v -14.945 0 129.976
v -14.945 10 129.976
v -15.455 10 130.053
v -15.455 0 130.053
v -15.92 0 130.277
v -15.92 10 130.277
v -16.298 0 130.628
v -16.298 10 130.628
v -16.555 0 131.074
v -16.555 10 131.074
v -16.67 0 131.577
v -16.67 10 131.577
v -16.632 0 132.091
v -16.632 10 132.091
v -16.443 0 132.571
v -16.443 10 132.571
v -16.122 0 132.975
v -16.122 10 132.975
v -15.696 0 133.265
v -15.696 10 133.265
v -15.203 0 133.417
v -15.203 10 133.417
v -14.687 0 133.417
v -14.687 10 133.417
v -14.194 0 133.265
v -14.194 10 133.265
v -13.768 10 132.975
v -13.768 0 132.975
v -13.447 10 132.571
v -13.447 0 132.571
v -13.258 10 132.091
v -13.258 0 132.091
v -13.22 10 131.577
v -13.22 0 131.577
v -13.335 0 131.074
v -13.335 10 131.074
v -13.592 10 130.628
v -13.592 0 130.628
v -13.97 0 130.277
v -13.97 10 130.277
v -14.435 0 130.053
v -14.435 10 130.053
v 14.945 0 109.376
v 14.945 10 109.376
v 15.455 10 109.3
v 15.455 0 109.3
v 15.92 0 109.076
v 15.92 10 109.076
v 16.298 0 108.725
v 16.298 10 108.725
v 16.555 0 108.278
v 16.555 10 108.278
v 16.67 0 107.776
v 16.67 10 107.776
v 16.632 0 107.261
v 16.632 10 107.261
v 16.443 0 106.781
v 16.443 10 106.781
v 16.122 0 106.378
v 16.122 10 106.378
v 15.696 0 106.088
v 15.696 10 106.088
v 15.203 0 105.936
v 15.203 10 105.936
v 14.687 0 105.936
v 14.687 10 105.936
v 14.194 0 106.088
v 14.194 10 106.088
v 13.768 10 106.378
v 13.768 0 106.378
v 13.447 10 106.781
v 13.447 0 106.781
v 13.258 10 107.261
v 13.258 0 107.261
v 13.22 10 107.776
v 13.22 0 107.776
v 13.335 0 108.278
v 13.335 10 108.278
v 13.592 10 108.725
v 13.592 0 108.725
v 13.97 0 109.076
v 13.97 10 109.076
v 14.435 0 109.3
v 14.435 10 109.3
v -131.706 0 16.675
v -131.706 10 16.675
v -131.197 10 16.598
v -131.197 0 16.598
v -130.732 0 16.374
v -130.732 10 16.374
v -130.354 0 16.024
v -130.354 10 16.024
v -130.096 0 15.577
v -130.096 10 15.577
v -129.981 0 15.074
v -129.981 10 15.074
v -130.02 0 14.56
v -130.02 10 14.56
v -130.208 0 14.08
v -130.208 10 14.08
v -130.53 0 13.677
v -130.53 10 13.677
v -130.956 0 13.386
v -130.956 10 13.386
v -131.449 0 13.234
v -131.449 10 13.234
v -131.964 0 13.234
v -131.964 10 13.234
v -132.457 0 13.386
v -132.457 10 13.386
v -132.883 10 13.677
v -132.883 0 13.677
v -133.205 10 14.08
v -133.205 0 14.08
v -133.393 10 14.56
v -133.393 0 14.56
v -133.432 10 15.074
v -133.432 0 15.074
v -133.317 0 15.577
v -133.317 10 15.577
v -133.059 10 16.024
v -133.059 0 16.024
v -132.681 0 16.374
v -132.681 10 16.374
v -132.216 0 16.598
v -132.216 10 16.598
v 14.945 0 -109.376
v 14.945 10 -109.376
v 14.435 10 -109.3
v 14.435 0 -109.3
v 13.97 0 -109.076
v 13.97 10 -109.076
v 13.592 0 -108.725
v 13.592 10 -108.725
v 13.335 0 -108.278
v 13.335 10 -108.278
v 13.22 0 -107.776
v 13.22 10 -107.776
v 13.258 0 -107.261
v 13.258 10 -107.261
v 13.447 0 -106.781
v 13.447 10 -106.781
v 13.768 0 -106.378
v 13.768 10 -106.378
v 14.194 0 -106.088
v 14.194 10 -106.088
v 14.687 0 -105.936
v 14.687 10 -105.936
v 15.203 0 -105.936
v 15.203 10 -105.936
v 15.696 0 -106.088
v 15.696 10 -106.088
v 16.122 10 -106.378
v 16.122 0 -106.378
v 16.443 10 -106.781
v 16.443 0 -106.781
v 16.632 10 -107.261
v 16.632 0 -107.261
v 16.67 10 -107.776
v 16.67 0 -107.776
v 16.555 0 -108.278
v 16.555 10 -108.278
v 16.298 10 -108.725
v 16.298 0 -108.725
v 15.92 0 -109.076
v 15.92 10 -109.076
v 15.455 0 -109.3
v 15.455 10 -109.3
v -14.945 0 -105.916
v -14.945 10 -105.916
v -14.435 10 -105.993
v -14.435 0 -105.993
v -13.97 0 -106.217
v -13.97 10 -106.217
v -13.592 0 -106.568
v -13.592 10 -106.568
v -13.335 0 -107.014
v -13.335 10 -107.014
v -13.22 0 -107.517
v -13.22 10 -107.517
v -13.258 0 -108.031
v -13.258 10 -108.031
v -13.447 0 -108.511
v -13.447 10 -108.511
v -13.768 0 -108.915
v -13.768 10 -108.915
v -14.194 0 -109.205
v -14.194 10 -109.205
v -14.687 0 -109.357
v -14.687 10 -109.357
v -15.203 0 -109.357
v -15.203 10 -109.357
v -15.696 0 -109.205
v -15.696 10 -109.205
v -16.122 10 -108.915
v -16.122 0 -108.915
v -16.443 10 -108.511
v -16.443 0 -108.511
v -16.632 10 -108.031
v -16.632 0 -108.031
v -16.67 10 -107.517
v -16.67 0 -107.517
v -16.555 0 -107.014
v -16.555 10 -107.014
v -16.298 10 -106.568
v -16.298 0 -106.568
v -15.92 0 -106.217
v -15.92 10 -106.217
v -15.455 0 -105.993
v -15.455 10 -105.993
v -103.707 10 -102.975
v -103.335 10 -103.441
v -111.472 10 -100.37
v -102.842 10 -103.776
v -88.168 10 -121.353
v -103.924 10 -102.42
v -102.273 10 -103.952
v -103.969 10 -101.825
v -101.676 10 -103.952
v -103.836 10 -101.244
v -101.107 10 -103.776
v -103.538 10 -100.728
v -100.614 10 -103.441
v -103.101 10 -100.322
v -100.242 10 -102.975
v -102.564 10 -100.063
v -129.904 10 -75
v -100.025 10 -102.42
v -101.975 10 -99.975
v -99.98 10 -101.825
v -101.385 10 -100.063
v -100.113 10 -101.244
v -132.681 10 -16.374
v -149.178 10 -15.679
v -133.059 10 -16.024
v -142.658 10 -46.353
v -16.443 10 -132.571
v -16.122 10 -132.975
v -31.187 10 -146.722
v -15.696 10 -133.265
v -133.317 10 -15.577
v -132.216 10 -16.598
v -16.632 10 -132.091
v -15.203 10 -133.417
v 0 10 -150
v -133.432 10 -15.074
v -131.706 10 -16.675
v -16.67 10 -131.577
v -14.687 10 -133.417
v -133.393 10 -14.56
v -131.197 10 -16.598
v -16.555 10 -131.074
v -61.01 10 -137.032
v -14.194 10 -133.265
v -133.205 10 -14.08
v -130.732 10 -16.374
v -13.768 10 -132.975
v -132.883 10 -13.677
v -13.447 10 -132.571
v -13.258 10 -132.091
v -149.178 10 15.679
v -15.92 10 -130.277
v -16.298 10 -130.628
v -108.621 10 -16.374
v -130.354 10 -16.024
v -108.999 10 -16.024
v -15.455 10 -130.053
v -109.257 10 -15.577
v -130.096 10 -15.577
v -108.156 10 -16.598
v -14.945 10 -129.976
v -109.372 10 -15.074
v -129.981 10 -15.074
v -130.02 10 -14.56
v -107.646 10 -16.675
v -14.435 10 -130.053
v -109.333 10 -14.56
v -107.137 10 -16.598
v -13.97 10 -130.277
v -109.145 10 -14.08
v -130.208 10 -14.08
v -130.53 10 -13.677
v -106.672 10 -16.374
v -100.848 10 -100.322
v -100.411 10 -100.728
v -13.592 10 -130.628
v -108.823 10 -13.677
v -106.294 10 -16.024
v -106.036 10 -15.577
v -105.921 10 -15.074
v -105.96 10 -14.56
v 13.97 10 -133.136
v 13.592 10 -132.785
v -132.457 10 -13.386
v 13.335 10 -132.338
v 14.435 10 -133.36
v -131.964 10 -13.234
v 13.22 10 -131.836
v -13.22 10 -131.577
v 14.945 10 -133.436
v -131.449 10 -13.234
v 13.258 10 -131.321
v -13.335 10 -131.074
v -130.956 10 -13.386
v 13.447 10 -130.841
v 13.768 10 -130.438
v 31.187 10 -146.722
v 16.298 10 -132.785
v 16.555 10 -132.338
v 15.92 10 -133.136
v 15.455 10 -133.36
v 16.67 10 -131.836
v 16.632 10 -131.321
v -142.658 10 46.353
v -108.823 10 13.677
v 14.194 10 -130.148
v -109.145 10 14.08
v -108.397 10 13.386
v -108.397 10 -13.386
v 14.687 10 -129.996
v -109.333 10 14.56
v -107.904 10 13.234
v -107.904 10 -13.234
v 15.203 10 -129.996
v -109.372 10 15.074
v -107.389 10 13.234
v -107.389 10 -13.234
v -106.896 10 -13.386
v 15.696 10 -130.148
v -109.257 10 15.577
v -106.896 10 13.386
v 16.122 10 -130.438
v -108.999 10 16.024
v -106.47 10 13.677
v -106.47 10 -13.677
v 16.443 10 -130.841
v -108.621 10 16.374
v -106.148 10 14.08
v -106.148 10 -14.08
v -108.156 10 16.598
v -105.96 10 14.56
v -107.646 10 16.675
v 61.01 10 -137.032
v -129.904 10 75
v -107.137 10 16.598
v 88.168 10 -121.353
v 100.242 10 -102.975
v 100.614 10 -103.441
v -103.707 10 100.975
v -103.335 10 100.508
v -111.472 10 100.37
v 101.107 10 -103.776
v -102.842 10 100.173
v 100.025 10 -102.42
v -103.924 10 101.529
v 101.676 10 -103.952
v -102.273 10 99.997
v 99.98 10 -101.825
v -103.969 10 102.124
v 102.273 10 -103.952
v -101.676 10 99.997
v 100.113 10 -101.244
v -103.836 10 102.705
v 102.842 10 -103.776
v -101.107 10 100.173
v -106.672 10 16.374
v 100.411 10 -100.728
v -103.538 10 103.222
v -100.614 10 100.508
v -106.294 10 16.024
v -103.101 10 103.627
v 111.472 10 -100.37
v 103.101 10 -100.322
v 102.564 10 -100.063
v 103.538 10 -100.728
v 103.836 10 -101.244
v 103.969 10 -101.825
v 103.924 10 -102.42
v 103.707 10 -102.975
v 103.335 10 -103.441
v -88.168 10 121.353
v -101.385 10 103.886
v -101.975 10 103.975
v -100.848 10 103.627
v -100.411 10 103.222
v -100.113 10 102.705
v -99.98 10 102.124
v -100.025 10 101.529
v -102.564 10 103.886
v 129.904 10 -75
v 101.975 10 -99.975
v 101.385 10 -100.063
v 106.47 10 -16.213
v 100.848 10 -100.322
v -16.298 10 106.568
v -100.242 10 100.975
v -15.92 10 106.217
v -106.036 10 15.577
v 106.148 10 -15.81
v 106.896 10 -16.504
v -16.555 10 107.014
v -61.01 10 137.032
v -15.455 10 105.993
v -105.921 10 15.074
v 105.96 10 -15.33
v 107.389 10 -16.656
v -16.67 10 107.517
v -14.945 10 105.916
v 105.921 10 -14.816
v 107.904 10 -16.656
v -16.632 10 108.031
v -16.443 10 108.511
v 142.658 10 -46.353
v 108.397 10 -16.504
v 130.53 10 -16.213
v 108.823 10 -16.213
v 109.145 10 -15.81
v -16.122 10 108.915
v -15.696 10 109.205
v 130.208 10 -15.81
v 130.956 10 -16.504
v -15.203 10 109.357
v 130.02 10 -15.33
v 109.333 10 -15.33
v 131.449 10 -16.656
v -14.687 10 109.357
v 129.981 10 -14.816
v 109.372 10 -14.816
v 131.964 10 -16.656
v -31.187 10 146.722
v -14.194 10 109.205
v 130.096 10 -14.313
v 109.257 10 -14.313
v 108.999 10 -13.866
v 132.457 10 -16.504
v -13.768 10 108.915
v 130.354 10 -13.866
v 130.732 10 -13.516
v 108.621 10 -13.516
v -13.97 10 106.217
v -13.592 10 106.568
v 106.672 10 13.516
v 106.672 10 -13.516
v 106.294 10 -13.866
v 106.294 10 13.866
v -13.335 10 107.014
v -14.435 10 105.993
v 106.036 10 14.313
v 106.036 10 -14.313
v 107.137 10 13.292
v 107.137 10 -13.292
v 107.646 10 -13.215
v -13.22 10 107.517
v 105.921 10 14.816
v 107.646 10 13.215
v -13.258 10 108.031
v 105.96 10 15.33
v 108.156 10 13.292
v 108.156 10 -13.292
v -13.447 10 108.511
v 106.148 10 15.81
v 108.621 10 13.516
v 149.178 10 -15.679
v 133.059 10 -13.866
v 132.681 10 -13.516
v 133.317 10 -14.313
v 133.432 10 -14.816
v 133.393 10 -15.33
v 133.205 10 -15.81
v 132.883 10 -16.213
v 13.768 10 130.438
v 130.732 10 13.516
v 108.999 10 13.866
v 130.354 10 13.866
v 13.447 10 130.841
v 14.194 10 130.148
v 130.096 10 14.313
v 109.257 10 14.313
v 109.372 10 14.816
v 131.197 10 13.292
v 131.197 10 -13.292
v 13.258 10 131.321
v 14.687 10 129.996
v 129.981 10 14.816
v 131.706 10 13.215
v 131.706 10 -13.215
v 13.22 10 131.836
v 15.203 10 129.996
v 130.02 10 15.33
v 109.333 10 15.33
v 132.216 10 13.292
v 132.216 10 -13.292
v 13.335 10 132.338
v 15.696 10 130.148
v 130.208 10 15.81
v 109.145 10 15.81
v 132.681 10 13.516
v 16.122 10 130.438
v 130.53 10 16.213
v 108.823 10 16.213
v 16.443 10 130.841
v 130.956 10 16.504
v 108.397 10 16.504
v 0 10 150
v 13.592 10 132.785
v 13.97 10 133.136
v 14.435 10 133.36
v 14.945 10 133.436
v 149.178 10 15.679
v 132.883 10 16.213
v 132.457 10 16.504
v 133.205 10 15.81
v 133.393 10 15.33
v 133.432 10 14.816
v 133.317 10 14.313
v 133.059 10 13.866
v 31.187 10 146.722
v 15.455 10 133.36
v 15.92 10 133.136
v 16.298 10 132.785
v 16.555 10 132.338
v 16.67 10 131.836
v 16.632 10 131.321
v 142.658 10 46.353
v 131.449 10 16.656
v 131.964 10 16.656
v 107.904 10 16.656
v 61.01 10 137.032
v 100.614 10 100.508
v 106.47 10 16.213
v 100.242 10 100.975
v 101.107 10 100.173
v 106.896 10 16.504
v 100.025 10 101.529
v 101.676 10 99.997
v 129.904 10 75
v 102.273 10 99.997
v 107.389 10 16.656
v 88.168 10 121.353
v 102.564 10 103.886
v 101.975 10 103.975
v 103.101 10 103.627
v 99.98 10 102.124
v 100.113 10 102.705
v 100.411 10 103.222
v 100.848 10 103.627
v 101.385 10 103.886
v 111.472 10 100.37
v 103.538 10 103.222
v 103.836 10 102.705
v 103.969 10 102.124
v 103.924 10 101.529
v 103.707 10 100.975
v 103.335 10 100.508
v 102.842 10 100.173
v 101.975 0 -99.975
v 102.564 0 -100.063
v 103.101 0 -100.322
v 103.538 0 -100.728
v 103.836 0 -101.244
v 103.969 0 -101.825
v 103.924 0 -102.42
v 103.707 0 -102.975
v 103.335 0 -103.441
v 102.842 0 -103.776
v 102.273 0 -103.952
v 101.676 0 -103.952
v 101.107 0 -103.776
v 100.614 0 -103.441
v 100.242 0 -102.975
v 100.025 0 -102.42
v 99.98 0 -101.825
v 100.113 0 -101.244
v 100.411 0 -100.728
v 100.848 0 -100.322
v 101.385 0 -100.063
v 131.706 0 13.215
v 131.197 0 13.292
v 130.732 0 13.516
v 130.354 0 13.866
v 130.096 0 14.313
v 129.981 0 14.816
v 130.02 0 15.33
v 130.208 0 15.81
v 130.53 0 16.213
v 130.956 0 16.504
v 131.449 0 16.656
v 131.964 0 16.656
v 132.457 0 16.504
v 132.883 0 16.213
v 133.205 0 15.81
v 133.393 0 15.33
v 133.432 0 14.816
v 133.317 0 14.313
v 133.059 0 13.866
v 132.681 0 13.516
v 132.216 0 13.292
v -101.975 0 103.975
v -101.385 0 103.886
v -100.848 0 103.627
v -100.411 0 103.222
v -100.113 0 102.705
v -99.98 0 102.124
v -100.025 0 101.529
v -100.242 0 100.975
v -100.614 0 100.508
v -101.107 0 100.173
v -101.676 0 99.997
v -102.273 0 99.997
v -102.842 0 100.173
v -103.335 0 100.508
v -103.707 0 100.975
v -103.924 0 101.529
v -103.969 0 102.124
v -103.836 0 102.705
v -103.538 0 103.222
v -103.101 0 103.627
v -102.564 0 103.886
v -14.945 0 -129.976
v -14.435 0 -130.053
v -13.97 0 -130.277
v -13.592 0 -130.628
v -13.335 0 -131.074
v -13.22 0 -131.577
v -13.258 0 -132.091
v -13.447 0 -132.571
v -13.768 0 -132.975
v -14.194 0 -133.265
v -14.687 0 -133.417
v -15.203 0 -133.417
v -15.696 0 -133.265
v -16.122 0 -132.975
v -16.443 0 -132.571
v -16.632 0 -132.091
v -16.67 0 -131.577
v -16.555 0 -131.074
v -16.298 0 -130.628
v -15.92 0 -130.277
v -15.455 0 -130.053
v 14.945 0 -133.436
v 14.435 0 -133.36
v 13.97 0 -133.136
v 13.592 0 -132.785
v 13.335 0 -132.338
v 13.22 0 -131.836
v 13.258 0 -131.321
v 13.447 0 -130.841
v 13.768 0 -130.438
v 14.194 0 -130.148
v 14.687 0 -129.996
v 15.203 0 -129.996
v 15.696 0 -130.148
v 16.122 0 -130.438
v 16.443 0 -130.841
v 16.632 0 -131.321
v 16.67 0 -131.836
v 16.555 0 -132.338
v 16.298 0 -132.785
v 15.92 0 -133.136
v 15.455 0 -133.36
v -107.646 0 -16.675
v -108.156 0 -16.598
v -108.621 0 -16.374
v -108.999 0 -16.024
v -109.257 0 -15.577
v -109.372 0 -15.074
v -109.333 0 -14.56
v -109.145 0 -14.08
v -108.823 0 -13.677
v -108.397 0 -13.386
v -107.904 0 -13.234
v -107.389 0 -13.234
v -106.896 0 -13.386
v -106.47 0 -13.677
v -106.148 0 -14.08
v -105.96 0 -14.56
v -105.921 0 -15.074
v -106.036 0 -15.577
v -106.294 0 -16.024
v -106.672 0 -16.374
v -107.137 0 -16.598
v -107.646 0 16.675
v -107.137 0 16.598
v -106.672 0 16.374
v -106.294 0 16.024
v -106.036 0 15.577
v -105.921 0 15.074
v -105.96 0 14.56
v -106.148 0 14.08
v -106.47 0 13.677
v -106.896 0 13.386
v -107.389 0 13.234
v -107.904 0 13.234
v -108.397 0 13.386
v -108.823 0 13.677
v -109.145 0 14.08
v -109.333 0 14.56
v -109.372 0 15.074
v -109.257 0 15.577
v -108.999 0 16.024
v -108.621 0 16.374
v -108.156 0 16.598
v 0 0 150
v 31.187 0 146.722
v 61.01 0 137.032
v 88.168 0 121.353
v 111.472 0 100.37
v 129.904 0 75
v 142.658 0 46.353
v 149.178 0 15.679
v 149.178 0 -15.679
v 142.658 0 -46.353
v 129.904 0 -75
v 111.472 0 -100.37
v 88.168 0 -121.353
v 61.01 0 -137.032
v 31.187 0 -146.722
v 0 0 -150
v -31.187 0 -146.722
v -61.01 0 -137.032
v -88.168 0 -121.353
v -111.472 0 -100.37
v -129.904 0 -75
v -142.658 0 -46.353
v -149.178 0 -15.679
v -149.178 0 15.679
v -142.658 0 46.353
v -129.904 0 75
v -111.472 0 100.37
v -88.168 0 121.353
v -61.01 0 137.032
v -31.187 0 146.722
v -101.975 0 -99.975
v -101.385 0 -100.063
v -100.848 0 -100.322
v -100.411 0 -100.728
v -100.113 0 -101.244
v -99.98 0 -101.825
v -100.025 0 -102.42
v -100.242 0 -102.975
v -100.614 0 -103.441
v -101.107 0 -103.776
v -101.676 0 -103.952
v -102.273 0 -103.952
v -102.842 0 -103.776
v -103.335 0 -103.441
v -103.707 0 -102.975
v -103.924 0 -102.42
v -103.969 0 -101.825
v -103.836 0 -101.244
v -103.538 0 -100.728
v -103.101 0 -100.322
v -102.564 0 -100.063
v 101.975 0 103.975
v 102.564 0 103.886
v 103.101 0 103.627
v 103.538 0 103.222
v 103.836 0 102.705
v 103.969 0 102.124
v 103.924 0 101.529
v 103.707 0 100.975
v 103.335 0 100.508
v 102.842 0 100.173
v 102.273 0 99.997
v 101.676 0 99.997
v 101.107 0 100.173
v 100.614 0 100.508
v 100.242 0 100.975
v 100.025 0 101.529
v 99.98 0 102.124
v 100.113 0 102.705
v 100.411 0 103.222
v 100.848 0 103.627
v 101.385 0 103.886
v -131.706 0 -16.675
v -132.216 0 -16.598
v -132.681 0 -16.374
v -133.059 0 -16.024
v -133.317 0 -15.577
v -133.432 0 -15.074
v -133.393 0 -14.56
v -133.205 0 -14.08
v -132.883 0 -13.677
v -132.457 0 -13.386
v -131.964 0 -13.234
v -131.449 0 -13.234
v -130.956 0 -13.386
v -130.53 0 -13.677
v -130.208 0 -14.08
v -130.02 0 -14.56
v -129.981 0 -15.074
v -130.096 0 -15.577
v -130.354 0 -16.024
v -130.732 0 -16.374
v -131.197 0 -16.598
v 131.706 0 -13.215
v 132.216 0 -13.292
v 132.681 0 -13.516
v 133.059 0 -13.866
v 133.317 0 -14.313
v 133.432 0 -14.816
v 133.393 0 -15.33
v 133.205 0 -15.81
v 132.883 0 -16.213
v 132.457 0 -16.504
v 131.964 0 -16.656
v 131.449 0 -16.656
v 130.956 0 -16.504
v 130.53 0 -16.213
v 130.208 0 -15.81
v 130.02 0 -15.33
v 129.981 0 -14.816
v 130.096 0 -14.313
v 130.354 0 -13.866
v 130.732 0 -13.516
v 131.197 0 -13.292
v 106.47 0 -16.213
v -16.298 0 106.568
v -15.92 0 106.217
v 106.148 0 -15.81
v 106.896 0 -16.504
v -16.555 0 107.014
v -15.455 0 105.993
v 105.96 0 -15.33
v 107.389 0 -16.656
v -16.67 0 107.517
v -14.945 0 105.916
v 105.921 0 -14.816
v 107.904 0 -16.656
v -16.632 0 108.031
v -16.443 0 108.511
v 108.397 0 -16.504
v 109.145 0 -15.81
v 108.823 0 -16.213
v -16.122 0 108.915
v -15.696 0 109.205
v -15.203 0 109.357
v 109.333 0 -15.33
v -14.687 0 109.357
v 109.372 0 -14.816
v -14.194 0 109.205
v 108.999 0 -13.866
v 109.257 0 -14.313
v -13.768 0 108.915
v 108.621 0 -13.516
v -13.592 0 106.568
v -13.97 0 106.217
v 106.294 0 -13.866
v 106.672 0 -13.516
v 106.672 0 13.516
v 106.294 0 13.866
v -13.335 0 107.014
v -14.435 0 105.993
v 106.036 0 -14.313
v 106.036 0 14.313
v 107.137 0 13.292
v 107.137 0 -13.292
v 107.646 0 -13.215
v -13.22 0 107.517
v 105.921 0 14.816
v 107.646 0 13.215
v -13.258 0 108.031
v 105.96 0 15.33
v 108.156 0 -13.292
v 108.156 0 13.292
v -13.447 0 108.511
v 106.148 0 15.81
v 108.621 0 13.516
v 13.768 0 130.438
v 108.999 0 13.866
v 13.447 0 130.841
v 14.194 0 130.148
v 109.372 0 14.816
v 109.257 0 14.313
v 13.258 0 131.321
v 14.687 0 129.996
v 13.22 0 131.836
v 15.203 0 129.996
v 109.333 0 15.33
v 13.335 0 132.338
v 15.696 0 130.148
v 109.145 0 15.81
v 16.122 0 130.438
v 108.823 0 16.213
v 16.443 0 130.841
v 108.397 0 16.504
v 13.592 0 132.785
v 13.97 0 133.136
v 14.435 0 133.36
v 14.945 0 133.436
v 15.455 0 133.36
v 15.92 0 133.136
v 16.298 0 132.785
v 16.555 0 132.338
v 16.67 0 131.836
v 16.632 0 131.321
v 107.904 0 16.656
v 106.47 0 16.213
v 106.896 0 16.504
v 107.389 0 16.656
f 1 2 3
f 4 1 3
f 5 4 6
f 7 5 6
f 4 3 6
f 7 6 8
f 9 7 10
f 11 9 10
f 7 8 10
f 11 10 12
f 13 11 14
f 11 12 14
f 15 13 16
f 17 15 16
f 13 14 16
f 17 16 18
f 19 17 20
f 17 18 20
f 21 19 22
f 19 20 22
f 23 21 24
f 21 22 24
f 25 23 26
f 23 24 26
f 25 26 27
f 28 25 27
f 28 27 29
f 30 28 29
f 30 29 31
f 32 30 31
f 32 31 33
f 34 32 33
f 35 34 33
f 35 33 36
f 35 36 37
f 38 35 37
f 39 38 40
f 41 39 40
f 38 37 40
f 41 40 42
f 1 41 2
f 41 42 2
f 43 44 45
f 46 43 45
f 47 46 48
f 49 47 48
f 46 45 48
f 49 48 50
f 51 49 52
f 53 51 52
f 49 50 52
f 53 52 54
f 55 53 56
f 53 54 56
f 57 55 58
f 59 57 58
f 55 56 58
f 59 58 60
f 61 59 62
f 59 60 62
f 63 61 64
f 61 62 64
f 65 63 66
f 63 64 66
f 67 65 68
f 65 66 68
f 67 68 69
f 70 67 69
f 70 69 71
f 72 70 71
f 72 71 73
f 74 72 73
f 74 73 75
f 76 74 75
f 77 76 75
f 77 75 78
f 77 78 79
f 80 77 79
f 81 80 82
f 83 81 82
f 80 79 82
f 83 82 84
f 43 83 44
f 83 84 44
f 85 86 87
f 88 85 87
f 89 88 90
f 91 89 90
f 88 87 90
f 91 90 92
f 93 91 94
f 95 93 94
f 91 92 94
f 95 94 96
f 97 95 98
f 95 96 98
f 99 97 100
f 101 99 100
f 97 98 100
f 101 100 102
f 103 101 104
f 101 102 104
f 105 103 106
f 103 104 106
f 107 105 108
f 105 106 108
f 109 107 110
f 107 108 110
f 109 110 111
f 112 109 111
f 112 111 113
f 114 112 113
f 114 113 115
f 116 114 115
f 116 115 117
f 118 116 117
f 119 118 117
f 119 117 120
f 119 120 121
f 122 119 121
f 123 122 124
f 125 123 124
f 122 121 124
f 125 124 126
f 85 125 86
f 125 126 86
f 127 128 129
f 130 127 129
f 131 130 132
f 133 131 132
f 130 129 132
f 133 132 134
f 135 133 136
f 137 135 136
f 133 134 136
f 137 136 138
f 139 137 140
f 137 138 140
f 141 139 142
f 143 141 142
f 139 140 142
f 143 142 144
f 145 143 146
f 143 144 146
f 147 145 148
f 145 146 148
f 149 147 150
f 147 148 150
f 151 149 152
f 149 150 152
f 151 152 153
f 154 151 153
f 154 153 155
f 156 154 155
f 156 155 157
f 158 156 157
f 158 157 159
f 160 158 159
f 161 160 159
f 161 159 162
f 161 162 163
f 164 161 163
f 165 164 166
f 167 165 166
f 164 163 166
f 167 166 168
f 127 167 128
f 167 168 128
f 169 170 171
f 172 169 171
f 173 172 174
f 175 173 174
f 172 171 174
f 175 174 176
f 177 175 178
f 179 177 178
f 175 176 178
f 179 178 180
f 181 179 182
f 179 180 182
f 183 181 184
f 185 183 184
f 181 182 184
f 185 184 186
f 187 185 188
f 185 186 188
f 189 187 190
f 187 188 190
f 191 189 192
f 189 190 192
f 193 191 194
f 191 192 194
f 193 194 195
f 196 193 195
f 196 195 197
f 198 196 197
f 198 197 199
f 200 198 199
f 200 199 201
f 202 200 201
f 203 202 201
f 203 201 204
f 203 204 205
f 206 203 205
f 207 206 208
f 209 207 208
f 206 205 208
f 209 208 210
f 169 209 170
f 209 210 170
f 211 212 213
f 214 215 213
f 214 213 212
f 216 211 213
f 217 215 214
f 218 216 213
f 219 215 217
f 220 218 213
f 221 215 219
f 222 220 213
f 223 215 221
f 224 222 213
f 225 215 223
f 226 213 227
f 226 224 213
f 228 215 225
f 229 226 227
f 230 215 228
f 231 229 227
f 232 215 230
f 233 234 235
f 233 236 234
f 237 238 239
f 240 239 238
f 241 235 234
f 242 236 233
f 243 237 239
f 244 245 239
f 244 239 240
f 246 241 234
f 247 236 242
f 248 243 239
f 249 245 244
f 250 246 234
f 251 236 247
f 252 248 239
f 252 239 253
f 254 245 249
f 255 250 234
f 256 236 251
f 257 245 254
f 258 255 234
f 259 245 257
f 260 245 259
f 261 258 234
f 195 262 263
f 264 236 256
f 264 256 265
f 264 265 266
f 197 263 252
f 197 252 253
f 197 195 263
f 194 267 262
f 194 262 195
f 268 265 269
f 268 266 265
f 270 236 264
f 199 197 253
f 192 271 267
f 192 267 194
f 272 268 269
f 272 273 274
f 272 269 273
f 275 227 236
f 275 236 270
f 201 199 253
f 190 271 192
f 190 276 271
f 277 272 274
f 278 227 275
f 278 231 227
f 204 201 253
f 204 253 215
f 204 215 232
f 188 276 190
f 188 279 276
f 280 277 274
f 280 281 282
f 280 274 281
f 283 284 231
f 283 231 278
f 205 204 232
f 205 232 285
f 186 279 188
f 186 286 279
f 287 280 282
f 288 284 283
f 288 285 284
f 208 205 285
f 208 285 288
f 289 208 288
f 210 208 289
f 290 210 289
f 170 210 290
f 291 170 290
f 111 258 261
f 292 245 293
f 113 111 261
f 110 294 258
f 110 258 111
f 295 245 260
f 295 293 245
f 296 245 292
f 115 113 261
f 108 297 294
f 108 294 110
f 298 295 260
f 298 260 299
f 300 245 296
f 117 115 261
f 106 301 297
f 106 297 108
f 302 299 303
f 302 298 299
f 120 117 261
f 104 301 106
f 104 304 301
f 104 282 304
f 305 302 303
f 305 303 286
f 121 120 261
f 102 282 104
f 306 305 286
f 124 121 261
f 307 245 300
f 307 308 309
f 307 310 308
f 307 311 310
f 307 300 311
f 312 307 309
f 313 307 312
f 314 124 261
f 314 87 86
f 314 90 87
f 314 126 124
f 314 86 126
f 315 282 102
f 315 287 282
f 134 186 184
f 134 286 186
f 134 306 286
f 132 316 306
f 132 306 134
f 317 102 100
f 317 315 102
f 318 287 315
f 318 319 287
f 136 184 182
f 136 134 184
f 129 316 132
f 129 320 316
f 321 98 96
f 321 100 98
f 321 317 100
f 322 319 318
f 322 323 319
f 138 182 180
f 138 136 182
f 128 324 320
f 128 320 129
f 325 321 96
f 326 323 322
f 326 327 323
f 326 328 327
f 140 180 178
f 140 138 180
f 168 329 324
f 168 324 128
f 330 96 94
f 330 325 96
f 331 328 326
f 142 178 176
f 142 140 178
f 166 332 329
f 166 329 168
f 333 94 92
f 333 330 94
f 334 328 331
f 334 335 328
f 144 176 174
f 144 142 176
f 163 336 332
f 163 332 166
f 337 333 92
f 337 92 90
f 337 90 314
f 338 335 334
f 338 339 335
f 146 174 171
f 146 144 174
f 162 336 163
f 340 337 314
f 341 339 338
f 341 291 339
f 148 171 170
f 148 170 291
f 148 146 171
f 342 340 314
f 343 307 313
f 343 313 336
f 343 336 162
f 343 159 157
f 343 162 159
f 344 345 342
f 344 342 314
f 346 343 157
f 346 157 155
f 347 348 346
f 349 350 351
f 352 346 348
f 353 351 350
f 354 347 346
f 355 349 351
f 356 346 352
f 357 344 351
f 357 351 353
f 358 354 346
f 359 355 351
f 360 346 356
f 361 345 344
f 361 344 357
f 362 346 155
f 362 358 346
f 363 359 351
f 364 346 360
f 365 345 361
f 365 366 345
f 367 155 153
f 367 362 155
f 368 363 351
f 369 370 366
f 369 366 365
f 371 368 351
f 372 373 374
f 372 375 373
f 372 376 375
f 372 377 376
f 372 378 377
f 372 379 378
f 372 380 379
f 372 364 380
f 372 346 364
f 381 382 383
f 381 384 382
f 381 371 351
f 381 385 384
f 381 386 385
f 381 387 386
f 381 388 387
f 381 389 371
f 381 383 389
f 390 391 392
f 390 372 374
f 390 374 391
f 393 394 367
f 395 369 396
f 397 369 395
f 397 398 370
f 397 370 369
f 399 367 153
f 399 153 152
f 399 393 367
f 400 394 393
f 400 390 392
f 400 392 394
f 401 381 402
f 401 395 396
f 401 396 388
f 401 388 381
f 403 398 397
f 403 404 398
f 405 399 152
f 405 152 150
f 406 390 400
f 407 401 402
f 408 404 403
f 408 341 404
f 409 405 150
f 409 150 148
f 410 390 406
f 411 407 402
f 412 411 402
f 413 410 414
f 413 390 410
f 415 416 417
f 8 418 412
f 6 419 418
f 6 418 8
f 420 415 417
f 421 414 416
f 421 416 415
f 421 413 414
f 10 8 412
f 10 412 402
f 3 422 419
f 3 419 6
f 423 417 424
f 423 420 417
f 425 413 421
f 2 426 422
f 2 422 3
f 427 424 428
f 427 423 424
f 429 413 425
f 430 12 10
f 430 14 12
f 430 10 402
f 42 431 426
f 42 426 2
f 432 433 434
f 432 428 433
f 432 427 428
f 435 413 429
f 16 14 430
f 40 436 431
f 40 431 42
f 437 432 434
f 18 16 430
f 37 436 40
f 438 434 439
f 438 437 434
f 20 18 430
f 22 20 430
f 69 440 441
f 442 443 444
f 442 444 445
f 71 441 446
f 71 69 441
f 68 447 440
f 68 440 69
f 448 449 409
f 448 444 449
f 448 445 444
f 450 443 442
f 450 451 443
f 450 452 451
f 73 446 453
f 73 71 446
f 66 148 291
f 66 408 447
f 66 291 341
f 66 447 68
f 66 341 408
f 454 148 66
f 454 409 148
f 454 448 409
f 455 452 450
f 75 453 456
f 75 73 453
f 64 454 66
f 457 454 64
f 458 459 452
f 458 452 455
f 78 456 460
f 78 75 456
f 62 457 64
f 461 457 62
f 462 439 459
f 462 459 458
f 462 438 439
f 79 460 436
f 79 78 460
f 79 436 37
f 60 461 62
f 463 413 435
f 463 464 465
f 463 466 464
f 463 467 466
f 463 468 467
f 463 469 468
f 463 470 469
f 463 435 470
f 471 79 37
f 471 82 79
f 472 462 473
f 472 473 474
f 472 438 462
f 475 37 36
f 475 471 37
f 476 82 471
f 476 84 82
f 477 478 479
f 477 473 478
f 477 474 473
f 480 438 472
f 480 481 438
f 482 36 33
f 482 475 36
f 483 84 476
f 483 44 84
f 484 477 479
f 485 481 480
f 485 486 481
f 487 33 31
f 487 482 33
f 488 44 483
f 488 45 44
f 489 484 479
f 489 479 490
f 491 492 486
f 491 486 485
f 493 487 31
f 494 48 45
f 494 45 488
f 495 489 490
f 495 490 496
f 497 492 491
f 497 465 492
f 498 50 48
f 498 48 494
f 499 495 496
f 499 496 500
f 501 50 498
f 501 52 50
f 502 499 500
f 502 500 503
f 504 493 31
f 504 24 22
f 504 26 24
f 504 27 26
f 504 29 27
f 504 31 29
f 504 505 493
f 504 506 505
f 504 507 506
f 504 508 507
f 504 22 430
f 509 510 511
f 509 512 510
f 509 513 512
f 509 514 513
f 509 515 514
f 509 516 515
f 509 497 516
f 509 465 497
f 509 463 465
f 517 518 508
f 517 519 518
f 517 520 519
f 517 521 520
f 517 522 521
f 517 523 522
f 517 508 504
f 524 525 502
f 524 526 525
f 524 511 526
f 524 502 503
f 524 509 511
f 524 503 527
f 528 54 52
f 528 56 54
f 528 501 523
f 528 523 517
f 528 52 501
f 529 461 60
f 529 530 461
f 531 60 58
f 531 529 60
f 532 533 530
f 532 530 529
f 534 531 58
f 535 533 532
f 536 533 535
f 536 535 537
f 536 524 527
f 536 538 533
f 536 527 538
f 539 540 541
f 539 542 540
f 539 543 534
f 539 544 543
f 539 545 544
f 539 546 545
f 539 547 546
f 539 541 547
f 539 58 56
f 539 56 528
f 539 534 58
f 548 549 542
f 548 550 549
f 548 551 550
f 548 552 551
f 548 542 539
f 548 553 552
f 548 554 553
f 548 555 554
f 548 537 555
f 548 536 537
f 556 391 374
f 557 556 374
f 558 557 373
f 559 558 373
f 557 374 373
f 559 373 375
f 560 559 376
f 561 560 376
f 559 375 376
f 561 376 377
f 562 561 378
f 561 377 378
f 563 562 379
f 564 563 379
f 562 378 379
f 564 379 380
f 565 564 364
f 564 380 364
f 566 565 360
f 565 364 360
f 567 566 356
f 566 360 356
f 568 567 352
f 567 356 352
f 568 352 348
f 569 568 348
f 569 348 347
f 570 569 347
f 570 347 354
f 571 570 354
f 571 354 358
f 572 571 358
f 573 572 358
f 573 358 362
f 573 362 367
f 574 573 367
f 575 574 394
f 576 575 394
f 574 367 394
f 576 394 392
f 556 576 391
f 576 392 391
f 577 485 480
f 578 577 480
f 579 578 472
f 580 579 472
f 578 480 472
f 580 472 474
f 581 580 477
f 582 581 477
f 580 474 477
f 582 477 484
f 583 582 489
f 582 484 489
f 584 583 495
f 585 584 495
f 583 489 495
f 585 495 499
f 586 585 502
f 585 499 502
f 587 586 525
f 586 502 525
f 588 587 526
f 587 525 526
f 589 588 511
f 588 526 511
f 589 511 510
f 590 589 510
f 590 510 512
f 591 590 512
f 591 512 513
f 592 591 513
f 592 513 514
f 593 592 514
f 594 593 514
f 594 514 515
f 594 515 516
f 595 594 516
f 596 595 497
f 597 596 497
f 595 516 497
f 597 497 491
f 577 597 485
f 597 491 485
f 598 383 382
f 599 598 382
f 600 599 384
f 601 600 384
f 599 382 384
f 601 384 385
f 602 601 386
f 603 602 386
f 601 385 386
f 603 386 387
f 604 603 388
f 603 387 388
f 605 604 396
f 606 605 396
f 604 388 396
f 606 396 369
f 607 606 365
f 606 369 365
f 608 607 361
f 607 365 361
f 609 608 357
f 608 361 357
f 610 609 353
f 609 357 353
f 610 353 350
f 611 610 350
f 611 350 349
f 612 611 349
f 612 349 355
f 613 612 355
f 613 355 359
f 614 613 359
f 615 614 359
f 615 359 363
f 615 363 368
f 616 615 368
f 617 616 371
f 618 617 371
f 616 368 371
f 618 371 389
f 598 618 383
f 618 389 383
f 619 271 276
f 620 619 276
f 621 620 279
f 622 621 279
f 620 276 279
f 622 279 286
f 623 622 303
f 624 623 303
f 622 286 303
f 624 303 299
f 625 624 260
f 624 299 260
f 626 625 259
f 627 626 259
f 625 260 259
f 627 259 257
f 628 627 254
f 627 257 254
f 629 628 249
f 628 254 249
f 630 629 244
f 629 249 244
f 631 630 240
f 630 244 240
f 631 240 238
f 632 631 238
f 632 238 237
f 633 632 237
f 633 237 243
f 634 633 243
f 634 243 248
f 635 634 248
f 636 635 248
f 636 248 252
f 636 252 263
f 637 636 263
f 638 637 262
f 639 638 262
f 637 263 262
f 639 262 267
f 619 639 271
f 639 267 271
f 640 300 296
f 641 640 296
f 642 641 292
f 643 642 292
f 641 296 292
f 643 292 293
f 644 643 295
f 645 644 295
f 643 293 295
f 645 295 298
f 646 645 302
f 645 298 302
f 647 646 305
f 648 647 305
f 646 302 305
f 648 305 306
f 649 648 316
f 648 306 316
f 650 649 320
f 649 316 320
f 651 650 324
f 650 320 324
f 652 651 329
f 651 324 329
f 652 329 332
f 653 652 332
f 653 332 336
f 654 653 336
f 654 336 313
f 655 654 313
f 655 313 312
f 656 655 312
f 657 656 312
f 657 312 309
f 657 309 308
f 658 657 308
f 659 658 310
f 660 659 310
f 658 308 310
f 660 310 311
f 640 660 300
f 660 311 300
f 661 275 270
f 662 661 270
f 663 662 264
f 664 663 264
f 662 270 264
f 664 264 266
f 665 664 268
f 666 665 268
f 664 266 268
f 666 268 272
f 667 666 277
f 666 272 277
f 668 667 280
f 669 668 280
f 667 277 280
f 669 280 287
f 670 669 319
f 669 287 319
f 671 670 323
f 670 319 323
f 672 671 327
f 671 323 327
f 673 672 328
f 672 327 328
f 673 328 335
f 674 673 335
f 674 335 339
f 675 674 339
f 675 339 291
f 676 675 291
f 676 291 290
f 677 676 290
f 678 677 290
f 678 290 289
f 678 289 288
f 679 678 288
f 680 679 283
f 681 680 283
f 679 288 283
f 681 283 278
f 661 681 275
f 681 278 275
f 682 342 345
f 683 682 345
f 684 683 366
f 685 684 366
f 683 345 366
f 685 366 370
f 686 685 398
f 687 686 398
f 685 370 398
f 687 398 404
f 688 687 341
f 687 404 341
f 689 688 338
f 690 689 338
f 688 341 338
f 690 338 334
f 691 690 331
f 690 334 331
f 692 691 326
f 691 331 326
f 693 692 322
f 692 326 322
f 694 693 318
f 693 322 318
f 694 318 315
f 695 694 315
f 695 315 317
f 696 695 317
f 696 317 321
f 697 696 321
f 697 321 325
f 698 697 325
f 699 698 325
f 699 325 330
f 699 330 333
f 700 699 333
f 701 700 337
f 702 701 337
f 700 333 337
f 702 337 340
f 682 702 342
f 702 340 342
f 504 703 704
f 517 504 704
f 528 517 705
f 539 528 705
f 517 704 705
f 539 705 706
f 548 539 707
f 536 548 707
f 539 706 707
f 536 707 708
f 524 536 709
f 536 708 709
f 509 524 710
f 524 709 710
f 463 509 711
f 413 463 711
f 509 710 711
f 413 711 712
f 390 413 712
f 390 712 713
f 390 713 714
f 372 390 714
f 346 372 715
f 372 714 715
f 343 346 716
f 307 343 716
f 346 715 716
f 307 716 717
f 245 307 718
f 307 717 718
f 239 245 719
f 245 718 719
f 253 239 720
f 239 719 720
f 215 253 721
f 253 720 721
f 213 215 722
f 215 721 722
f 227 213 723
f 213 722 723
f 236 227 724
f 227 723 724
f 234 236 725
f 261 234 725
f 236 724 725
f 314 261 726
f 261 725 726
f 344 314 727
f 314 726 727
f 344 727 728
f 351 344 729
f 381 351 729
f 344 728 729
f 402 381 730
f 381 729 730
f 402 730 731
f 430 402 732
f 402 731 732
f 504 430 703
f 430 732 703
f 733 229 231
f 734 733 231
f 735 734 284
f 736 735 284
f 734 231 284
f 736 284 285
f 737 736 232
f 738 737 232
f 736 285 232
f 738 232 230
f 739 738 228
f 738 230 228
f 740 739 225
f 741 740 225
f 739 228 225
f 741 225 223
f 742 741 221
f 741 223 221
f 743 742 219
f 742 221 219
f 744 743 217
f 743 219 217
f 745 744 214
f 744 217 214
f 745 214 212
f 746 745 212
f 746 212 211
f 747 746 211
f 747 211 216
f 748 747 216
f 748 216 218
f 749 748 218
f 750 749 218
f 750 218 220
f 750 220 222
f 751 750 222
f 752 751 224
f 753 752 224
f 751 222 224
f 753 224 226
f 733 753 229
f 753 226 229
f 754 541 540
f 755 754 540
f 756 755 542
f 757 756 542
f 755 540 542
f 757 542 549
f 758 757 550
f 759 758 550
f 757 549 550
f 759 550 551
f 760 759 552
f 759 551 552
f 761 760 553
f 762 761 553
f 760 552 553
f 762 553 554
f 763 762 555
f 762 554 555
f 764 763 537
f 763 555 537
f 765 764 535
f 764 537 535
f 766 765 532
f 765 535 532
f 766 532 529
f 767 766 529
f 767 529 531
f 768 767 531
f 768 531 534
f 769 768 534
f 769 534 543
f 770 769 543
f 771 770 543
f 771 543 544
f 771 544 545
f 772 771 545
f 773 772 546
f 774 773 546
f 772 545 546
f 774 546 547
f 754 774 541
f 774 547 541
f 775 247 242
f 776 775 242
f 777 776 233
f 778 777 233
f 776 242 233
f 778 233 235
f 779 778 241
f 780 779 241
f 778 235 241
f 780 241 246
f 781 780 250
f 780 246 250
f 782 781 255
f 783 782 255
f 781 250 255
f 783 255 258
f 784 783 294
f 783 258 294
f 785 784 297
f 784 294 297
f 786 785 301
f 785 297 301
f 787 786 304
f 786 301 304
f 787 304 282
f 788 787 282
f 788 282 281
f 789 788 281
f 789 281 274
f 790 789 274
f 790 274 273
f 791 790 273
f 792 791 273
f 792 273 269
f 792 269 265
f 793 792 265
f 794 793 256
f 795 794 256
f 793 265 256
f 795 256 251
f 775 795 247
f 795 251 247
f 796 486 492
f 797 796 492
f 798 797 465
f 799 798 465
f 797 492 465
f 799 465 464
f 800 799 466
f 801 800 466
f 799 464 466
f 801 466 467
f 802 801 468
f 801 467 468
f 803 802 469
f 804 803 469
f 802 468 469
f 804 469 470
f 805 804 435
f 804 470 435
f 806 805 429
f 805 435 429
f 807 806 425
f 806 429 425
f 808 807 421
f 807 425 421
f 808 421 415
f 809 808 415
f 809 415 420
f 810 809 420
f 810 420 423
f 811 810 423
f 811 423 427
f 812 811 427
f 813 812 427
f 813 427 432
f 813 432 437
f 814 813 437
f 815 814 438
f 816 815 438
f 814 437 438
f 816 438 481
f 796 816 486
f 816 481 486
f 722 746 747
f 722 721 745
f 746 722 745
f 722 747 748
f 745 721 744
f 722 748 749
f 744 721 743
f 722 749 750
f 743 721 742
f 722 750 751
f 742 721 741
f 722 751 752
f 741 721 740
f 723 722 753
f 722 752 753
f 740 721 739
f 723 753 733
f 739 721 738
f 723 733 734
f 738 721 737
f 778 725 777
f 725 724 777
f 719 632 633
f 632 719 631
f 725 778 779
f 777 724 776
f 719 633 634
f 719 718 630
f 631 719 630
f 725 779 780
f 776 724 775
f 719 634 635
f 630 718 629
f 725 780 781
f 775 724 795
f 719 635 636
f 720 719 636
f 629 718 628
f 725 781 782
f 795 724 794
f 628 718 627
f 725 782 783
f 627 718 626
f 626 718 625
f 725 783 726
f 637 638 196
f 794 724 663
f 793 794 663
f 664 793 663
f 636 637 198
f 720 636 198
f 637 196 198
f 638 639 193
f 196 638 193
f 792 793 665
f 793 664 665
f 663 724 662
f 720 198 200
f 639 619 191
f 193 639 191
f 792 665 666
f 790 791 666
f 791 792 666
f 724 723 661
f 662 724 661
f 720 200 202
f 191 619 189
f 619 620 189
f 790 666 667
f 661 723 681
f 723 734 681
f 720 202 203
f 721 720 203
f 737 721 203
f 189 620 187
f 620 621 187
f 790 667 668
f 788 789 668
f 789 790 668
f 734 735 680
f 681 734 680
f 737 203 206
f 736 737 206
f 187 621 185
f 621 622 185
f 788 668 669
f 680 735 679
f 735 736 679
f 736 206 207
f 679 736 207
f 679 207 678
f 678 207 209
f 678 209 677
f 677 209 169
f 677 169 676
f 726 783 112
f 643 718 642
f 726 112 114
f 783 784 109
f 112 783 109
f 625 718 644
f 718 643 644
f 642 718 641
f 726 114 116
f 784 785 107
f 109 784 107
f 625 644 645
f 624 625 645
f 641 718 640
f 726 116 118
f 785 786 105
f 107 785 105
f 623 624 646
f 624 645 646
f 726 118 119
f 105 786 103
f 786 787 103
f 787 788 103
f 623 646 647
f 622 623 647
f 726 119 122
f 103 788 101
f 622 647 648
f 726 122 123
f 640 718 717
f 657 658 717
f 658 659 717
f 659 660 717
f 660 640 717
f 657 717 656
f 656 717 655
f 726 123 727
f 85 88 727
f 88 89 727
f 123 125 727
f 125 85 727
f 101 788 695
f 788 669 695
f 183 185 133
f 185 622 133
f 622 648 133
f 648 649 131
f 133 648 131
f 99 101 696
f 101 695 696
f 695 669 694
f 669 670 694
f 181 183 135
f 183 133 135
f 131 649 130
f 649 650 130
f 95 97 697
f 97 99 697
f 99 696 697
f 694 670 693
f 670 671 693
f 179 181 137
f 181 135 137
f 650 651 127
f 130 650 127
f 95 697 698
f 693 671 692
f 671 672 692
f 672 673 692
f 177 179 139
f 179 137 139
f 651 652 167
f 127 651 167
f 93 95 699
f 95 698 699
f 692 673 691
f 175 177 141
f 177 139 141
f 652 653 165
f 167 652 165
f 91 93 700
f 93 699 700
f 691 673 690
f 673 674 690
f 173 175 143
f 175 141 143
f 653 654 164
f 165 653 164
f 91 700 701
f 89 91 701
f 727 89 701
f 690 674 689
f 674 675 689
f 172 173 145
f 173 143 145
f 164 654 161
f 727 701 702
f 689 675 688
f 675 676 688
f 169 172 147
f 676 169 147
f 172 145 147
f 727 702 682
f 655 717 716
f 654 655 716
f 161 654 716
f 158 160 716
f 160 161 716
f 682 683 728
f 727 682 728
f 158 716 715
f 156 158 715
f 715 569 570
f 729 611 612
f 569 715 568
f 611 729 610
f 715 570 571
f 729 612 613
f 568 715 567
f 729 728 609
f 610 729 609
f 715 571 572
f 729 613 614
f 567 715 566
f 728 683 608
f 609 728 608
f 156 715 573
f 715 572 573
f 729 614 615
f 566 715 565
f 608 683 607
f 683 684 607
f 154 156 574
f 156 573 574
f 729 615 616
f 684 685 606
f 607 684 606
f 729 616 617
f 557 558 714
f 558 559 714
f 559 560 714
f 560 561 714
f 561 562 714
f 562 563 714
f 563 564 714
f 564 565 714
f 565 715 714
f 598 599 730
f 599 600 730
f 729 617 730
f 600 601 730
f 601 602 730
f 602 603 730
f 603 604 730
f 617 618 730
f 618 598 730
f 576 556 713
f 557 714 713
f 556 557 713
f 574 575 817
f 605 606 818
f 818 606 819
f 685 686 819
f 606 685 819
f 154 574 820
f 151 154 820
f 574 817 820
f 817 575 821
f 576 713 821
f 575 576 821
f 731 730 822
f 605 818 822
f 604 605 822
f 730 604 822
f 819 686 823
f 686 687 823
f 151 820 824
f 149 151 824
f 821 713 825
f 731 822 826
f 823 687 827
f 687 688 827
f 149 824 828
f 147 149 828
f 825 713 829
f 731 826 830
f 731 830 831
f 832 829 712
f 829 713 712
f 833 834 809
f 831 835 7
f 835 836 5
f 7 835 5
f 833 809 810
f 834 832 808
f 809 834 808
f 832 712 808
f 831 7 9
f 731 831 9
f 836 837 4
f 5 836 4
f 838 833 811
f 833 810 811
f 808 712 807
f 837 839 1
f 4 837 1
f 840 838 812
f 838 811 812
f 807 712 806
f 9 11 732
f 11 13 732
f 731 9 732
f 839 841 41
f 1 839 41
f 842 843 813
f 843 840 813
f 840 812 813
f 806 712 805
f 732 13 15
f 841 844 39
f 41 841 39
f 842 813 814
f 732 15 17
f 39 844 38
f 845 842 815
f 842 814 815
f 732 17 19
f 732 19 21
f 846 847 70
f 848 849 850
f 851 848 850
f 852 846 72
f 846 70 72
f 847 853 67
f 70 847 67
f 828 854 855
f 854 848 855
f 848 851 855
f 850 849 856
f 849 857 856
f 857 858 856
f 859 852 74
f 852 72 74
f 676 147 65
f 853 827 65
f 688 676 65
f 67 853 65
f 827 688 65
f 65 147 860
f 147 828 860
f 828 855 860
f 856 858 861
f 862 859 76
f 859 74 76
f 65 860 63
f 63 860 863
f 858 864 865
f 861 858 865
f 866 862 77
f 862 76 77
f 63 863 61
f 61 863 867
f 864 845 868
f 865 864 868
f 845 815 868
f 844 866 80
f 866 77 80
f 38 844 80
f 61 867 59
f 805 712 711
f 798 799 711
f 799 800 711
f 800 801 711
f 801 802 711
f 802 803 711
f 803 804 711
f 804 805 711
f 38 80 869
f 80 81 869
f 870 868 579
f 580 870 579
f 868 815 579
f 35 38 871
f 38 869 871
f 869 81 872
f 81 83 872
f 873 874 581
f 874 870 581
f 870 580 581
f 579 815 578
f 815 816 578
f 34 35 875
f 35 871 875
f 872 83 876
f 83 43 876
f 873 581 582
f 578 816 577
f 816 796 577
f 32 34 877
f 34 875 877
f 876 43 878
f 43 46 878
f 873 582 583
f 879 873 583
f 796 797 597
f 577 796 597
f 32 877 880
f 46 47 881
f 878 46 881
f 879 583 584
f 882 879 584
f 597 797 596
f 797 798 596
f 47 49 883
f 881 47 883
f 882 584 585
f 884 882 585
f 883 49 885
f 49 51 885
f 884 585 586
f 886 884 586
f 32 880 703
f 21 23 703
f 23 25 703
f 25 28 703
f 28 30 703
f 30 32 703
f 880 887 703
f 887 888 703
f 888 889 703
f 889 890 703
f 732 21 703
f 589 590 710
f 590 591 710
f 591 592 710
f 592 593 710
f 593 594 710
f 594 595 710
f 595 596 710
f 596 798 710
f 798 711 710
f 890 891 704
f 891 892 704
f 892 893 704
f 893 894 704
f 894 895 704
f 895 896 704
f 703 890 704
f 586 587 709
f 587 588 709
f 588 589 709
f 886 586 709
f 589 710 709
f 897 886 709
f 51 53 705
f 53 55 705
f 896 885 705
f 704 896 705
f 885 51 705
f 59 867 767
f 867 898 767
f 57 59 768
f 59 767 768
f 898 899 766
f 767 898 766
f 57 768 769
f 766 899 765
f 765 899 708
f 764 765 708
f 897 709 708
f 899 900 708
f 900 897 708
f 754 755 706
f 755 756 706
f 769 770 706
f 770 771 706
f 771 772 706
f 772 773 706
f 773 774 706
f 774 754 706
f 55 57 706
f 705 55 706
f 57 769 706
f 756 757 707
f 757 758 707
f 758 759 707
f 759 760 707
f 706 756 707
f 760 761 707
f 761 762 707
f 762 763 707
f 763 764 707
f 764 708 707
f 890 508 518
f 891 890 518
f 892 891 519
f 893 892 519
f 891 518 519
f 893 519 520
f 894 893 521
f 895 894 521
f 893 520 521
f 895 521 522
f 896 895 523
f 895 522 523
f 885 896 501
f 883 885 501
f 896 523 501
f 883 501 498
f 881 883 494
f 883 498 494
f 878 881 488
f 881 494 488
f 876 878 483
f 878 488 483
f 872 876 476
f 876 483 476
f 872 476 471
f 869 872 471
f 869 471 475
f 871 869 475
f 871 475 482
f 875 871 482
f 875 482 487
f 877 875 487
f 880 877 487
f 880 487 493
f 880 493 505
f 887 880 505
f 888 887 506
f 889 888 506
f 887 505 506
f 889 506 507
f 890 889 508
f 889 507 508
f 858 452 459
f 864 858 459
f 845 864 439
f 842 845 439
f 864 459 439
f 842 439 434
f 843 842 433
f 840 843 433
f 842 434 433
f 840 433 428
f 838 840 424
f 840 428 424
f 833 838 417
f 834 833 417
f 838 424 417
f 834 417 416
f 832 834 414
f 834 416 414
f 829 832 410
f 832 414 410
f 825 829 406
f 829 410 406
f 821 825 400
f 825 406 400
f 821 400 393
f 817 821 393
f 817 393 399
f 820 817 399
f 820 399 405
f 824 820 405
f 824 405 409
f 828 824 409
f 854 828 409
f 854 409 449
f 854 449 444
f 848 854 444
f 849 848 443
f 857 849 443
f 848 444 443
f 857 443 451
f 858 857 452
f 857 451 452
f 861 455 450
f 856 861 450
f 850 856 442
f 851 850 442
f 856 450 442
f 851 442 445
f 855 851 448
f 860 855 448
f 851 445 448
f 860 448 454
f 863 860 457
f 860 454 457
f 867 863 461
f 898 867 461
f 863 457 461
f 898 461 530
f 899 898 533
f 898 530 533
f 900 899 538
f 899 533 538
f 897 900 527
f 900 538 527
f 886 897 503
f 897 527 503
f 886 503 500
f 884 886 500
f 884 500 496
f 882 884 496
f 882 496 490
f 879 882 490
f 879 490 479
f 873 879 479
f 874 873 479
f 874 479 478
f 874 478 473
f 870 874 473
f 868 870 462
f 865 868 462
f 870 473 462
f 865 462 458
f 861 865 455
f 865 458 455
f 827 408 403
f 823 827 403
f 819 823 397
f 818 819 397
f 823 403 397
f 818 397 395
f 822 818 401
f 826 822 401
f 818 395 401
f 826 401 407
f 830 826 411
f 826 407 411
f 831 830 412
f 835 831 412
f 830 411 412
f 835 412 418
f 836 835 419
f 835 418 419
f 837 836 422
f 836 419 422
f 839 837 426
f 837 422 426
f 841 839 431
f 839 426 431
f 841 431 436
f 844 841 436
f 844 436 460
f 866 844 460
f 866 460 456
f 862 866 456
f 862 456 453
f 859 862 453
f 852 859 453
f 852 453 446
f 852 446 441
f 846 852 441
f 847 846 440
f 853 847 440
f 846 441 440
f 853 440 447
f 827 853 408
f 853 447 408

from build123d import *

# Parameters (mm, degrees)
SKETCH1_R           = 150
BOSS_EXTRUDE1_DEPTH = 10
SKETCH2_R           = 1.73
SKETCH2_R_2         = 2
CUT_EXTRUDE1_DEPTH  = 10


with BuildPart() as part:
    # Sketch1 → Boss-Extrude1 (new body)
    with BuildSketch(Plane(origin=(0, 0, 0), x_dir=(1, 0, 0), z_dir=(0, 1, 0))):
        with Locations(Location((0, 0, 0), (0, 0, 270))):
            Circle(SKETCH1_R)
    extrude(amount=BOSS_EXTRUDE1_DEPTH)

    # Sketch2 → Cut-Extrude1 (cut)
    with BuildSketch(Plane(origin=(0, 10, 0), x_dir=(1, 0, 0), z_dir=(0, 1, 0))):
        with Locations(Location((-14.945, 131.706442493, 0), (0, 0, 270))):
            Circle(SKETCH2_R)
        with Locations(Location((-14.945, 107.646442493, 0), (0, 0, 270))):
            Circle(SKETCH2_R)
        with Locations(Location((14.945, 107.646442493, 0), (0, 0, 90))):
            Circle(SKETCH2_R)
        with Locations(Location((14.945, 131.706442493, 0), (0, 0, 90))):
            Circle(SKETCH2_R)
        with Locations(Location((131.706442493, 14.945, 0), (0, 0, 270))):
            Circle(SKETCH2_R)
        with Locations(Location((131.706442493, -14.945, 0), (0, 0, 90))):
            Circle(SKETCH2_R)
        with Locations(Location((107.646442493, -14.945, 0), (0, 0, 90))):
            Circle(SKETCH2_R)
        with Locations(Location((107.646442493, 14.945, 0), (0, 0, 270))):
            Circle(SKETCH2_R)
        with Locations(Location((14.945, -131.706442493, 0), (0, 0, 270))):
            Circle(SKETCH2_R)
        with Locations(Location((-14.945, -131.706442493, 0), (0, 0, 90))):
            Circle(SKETCH2_R)
        with Locations(Location((-14.945, -107.646442493, 0), (0, 0, 90))):
            Circle(SKETCH2_R)
        with Locations(Location((14.945, -107.646442493, 0), (0, 0, 270))):
            Circle(SKETCH2_R)
        with Locations(Location((-131.706442493, -14.945, 0), (0, 0, 270))):
            Circle(SKETCH2_R)
        with Locations(Location((-131.706442493, 14.945, 0), (0, 0, 90))):
            Circle(SKETCH2_R)
        with Locations(Location((-107.646442493, 14.945, 0), (0, 0, 90))):
            Circle(SKETCH2_R)
        with Locations(Location((-107.646442493, -14.945, 0), (0, 0, 270))):
            Circle(SKETCH2_R)
        with Locations(Location((101.974532959, 101.974532959, 0), (0, 0, 270))):
            Circle(SKETCH2_R_2)
        with Locations(Location((101.974532959, -101.974532959, 0), (0, 0, 270))):
            Circle(SKETCH2_R_2)
        with Locations(Location((-101.974532959, -101.974532959, 0), (0, 0, 270))):
            Circle(SKETCH2_R_2)
        with Locations(Location((-101.974532959, 101.974532959, 0), (0, 0, 270))):
            Circle(SKETCH2_R_2)
    extrude(amount=-CUT_EXTRUDE1_DEPTH, mode=Mode.SUBTRACT)


solid = part.part
